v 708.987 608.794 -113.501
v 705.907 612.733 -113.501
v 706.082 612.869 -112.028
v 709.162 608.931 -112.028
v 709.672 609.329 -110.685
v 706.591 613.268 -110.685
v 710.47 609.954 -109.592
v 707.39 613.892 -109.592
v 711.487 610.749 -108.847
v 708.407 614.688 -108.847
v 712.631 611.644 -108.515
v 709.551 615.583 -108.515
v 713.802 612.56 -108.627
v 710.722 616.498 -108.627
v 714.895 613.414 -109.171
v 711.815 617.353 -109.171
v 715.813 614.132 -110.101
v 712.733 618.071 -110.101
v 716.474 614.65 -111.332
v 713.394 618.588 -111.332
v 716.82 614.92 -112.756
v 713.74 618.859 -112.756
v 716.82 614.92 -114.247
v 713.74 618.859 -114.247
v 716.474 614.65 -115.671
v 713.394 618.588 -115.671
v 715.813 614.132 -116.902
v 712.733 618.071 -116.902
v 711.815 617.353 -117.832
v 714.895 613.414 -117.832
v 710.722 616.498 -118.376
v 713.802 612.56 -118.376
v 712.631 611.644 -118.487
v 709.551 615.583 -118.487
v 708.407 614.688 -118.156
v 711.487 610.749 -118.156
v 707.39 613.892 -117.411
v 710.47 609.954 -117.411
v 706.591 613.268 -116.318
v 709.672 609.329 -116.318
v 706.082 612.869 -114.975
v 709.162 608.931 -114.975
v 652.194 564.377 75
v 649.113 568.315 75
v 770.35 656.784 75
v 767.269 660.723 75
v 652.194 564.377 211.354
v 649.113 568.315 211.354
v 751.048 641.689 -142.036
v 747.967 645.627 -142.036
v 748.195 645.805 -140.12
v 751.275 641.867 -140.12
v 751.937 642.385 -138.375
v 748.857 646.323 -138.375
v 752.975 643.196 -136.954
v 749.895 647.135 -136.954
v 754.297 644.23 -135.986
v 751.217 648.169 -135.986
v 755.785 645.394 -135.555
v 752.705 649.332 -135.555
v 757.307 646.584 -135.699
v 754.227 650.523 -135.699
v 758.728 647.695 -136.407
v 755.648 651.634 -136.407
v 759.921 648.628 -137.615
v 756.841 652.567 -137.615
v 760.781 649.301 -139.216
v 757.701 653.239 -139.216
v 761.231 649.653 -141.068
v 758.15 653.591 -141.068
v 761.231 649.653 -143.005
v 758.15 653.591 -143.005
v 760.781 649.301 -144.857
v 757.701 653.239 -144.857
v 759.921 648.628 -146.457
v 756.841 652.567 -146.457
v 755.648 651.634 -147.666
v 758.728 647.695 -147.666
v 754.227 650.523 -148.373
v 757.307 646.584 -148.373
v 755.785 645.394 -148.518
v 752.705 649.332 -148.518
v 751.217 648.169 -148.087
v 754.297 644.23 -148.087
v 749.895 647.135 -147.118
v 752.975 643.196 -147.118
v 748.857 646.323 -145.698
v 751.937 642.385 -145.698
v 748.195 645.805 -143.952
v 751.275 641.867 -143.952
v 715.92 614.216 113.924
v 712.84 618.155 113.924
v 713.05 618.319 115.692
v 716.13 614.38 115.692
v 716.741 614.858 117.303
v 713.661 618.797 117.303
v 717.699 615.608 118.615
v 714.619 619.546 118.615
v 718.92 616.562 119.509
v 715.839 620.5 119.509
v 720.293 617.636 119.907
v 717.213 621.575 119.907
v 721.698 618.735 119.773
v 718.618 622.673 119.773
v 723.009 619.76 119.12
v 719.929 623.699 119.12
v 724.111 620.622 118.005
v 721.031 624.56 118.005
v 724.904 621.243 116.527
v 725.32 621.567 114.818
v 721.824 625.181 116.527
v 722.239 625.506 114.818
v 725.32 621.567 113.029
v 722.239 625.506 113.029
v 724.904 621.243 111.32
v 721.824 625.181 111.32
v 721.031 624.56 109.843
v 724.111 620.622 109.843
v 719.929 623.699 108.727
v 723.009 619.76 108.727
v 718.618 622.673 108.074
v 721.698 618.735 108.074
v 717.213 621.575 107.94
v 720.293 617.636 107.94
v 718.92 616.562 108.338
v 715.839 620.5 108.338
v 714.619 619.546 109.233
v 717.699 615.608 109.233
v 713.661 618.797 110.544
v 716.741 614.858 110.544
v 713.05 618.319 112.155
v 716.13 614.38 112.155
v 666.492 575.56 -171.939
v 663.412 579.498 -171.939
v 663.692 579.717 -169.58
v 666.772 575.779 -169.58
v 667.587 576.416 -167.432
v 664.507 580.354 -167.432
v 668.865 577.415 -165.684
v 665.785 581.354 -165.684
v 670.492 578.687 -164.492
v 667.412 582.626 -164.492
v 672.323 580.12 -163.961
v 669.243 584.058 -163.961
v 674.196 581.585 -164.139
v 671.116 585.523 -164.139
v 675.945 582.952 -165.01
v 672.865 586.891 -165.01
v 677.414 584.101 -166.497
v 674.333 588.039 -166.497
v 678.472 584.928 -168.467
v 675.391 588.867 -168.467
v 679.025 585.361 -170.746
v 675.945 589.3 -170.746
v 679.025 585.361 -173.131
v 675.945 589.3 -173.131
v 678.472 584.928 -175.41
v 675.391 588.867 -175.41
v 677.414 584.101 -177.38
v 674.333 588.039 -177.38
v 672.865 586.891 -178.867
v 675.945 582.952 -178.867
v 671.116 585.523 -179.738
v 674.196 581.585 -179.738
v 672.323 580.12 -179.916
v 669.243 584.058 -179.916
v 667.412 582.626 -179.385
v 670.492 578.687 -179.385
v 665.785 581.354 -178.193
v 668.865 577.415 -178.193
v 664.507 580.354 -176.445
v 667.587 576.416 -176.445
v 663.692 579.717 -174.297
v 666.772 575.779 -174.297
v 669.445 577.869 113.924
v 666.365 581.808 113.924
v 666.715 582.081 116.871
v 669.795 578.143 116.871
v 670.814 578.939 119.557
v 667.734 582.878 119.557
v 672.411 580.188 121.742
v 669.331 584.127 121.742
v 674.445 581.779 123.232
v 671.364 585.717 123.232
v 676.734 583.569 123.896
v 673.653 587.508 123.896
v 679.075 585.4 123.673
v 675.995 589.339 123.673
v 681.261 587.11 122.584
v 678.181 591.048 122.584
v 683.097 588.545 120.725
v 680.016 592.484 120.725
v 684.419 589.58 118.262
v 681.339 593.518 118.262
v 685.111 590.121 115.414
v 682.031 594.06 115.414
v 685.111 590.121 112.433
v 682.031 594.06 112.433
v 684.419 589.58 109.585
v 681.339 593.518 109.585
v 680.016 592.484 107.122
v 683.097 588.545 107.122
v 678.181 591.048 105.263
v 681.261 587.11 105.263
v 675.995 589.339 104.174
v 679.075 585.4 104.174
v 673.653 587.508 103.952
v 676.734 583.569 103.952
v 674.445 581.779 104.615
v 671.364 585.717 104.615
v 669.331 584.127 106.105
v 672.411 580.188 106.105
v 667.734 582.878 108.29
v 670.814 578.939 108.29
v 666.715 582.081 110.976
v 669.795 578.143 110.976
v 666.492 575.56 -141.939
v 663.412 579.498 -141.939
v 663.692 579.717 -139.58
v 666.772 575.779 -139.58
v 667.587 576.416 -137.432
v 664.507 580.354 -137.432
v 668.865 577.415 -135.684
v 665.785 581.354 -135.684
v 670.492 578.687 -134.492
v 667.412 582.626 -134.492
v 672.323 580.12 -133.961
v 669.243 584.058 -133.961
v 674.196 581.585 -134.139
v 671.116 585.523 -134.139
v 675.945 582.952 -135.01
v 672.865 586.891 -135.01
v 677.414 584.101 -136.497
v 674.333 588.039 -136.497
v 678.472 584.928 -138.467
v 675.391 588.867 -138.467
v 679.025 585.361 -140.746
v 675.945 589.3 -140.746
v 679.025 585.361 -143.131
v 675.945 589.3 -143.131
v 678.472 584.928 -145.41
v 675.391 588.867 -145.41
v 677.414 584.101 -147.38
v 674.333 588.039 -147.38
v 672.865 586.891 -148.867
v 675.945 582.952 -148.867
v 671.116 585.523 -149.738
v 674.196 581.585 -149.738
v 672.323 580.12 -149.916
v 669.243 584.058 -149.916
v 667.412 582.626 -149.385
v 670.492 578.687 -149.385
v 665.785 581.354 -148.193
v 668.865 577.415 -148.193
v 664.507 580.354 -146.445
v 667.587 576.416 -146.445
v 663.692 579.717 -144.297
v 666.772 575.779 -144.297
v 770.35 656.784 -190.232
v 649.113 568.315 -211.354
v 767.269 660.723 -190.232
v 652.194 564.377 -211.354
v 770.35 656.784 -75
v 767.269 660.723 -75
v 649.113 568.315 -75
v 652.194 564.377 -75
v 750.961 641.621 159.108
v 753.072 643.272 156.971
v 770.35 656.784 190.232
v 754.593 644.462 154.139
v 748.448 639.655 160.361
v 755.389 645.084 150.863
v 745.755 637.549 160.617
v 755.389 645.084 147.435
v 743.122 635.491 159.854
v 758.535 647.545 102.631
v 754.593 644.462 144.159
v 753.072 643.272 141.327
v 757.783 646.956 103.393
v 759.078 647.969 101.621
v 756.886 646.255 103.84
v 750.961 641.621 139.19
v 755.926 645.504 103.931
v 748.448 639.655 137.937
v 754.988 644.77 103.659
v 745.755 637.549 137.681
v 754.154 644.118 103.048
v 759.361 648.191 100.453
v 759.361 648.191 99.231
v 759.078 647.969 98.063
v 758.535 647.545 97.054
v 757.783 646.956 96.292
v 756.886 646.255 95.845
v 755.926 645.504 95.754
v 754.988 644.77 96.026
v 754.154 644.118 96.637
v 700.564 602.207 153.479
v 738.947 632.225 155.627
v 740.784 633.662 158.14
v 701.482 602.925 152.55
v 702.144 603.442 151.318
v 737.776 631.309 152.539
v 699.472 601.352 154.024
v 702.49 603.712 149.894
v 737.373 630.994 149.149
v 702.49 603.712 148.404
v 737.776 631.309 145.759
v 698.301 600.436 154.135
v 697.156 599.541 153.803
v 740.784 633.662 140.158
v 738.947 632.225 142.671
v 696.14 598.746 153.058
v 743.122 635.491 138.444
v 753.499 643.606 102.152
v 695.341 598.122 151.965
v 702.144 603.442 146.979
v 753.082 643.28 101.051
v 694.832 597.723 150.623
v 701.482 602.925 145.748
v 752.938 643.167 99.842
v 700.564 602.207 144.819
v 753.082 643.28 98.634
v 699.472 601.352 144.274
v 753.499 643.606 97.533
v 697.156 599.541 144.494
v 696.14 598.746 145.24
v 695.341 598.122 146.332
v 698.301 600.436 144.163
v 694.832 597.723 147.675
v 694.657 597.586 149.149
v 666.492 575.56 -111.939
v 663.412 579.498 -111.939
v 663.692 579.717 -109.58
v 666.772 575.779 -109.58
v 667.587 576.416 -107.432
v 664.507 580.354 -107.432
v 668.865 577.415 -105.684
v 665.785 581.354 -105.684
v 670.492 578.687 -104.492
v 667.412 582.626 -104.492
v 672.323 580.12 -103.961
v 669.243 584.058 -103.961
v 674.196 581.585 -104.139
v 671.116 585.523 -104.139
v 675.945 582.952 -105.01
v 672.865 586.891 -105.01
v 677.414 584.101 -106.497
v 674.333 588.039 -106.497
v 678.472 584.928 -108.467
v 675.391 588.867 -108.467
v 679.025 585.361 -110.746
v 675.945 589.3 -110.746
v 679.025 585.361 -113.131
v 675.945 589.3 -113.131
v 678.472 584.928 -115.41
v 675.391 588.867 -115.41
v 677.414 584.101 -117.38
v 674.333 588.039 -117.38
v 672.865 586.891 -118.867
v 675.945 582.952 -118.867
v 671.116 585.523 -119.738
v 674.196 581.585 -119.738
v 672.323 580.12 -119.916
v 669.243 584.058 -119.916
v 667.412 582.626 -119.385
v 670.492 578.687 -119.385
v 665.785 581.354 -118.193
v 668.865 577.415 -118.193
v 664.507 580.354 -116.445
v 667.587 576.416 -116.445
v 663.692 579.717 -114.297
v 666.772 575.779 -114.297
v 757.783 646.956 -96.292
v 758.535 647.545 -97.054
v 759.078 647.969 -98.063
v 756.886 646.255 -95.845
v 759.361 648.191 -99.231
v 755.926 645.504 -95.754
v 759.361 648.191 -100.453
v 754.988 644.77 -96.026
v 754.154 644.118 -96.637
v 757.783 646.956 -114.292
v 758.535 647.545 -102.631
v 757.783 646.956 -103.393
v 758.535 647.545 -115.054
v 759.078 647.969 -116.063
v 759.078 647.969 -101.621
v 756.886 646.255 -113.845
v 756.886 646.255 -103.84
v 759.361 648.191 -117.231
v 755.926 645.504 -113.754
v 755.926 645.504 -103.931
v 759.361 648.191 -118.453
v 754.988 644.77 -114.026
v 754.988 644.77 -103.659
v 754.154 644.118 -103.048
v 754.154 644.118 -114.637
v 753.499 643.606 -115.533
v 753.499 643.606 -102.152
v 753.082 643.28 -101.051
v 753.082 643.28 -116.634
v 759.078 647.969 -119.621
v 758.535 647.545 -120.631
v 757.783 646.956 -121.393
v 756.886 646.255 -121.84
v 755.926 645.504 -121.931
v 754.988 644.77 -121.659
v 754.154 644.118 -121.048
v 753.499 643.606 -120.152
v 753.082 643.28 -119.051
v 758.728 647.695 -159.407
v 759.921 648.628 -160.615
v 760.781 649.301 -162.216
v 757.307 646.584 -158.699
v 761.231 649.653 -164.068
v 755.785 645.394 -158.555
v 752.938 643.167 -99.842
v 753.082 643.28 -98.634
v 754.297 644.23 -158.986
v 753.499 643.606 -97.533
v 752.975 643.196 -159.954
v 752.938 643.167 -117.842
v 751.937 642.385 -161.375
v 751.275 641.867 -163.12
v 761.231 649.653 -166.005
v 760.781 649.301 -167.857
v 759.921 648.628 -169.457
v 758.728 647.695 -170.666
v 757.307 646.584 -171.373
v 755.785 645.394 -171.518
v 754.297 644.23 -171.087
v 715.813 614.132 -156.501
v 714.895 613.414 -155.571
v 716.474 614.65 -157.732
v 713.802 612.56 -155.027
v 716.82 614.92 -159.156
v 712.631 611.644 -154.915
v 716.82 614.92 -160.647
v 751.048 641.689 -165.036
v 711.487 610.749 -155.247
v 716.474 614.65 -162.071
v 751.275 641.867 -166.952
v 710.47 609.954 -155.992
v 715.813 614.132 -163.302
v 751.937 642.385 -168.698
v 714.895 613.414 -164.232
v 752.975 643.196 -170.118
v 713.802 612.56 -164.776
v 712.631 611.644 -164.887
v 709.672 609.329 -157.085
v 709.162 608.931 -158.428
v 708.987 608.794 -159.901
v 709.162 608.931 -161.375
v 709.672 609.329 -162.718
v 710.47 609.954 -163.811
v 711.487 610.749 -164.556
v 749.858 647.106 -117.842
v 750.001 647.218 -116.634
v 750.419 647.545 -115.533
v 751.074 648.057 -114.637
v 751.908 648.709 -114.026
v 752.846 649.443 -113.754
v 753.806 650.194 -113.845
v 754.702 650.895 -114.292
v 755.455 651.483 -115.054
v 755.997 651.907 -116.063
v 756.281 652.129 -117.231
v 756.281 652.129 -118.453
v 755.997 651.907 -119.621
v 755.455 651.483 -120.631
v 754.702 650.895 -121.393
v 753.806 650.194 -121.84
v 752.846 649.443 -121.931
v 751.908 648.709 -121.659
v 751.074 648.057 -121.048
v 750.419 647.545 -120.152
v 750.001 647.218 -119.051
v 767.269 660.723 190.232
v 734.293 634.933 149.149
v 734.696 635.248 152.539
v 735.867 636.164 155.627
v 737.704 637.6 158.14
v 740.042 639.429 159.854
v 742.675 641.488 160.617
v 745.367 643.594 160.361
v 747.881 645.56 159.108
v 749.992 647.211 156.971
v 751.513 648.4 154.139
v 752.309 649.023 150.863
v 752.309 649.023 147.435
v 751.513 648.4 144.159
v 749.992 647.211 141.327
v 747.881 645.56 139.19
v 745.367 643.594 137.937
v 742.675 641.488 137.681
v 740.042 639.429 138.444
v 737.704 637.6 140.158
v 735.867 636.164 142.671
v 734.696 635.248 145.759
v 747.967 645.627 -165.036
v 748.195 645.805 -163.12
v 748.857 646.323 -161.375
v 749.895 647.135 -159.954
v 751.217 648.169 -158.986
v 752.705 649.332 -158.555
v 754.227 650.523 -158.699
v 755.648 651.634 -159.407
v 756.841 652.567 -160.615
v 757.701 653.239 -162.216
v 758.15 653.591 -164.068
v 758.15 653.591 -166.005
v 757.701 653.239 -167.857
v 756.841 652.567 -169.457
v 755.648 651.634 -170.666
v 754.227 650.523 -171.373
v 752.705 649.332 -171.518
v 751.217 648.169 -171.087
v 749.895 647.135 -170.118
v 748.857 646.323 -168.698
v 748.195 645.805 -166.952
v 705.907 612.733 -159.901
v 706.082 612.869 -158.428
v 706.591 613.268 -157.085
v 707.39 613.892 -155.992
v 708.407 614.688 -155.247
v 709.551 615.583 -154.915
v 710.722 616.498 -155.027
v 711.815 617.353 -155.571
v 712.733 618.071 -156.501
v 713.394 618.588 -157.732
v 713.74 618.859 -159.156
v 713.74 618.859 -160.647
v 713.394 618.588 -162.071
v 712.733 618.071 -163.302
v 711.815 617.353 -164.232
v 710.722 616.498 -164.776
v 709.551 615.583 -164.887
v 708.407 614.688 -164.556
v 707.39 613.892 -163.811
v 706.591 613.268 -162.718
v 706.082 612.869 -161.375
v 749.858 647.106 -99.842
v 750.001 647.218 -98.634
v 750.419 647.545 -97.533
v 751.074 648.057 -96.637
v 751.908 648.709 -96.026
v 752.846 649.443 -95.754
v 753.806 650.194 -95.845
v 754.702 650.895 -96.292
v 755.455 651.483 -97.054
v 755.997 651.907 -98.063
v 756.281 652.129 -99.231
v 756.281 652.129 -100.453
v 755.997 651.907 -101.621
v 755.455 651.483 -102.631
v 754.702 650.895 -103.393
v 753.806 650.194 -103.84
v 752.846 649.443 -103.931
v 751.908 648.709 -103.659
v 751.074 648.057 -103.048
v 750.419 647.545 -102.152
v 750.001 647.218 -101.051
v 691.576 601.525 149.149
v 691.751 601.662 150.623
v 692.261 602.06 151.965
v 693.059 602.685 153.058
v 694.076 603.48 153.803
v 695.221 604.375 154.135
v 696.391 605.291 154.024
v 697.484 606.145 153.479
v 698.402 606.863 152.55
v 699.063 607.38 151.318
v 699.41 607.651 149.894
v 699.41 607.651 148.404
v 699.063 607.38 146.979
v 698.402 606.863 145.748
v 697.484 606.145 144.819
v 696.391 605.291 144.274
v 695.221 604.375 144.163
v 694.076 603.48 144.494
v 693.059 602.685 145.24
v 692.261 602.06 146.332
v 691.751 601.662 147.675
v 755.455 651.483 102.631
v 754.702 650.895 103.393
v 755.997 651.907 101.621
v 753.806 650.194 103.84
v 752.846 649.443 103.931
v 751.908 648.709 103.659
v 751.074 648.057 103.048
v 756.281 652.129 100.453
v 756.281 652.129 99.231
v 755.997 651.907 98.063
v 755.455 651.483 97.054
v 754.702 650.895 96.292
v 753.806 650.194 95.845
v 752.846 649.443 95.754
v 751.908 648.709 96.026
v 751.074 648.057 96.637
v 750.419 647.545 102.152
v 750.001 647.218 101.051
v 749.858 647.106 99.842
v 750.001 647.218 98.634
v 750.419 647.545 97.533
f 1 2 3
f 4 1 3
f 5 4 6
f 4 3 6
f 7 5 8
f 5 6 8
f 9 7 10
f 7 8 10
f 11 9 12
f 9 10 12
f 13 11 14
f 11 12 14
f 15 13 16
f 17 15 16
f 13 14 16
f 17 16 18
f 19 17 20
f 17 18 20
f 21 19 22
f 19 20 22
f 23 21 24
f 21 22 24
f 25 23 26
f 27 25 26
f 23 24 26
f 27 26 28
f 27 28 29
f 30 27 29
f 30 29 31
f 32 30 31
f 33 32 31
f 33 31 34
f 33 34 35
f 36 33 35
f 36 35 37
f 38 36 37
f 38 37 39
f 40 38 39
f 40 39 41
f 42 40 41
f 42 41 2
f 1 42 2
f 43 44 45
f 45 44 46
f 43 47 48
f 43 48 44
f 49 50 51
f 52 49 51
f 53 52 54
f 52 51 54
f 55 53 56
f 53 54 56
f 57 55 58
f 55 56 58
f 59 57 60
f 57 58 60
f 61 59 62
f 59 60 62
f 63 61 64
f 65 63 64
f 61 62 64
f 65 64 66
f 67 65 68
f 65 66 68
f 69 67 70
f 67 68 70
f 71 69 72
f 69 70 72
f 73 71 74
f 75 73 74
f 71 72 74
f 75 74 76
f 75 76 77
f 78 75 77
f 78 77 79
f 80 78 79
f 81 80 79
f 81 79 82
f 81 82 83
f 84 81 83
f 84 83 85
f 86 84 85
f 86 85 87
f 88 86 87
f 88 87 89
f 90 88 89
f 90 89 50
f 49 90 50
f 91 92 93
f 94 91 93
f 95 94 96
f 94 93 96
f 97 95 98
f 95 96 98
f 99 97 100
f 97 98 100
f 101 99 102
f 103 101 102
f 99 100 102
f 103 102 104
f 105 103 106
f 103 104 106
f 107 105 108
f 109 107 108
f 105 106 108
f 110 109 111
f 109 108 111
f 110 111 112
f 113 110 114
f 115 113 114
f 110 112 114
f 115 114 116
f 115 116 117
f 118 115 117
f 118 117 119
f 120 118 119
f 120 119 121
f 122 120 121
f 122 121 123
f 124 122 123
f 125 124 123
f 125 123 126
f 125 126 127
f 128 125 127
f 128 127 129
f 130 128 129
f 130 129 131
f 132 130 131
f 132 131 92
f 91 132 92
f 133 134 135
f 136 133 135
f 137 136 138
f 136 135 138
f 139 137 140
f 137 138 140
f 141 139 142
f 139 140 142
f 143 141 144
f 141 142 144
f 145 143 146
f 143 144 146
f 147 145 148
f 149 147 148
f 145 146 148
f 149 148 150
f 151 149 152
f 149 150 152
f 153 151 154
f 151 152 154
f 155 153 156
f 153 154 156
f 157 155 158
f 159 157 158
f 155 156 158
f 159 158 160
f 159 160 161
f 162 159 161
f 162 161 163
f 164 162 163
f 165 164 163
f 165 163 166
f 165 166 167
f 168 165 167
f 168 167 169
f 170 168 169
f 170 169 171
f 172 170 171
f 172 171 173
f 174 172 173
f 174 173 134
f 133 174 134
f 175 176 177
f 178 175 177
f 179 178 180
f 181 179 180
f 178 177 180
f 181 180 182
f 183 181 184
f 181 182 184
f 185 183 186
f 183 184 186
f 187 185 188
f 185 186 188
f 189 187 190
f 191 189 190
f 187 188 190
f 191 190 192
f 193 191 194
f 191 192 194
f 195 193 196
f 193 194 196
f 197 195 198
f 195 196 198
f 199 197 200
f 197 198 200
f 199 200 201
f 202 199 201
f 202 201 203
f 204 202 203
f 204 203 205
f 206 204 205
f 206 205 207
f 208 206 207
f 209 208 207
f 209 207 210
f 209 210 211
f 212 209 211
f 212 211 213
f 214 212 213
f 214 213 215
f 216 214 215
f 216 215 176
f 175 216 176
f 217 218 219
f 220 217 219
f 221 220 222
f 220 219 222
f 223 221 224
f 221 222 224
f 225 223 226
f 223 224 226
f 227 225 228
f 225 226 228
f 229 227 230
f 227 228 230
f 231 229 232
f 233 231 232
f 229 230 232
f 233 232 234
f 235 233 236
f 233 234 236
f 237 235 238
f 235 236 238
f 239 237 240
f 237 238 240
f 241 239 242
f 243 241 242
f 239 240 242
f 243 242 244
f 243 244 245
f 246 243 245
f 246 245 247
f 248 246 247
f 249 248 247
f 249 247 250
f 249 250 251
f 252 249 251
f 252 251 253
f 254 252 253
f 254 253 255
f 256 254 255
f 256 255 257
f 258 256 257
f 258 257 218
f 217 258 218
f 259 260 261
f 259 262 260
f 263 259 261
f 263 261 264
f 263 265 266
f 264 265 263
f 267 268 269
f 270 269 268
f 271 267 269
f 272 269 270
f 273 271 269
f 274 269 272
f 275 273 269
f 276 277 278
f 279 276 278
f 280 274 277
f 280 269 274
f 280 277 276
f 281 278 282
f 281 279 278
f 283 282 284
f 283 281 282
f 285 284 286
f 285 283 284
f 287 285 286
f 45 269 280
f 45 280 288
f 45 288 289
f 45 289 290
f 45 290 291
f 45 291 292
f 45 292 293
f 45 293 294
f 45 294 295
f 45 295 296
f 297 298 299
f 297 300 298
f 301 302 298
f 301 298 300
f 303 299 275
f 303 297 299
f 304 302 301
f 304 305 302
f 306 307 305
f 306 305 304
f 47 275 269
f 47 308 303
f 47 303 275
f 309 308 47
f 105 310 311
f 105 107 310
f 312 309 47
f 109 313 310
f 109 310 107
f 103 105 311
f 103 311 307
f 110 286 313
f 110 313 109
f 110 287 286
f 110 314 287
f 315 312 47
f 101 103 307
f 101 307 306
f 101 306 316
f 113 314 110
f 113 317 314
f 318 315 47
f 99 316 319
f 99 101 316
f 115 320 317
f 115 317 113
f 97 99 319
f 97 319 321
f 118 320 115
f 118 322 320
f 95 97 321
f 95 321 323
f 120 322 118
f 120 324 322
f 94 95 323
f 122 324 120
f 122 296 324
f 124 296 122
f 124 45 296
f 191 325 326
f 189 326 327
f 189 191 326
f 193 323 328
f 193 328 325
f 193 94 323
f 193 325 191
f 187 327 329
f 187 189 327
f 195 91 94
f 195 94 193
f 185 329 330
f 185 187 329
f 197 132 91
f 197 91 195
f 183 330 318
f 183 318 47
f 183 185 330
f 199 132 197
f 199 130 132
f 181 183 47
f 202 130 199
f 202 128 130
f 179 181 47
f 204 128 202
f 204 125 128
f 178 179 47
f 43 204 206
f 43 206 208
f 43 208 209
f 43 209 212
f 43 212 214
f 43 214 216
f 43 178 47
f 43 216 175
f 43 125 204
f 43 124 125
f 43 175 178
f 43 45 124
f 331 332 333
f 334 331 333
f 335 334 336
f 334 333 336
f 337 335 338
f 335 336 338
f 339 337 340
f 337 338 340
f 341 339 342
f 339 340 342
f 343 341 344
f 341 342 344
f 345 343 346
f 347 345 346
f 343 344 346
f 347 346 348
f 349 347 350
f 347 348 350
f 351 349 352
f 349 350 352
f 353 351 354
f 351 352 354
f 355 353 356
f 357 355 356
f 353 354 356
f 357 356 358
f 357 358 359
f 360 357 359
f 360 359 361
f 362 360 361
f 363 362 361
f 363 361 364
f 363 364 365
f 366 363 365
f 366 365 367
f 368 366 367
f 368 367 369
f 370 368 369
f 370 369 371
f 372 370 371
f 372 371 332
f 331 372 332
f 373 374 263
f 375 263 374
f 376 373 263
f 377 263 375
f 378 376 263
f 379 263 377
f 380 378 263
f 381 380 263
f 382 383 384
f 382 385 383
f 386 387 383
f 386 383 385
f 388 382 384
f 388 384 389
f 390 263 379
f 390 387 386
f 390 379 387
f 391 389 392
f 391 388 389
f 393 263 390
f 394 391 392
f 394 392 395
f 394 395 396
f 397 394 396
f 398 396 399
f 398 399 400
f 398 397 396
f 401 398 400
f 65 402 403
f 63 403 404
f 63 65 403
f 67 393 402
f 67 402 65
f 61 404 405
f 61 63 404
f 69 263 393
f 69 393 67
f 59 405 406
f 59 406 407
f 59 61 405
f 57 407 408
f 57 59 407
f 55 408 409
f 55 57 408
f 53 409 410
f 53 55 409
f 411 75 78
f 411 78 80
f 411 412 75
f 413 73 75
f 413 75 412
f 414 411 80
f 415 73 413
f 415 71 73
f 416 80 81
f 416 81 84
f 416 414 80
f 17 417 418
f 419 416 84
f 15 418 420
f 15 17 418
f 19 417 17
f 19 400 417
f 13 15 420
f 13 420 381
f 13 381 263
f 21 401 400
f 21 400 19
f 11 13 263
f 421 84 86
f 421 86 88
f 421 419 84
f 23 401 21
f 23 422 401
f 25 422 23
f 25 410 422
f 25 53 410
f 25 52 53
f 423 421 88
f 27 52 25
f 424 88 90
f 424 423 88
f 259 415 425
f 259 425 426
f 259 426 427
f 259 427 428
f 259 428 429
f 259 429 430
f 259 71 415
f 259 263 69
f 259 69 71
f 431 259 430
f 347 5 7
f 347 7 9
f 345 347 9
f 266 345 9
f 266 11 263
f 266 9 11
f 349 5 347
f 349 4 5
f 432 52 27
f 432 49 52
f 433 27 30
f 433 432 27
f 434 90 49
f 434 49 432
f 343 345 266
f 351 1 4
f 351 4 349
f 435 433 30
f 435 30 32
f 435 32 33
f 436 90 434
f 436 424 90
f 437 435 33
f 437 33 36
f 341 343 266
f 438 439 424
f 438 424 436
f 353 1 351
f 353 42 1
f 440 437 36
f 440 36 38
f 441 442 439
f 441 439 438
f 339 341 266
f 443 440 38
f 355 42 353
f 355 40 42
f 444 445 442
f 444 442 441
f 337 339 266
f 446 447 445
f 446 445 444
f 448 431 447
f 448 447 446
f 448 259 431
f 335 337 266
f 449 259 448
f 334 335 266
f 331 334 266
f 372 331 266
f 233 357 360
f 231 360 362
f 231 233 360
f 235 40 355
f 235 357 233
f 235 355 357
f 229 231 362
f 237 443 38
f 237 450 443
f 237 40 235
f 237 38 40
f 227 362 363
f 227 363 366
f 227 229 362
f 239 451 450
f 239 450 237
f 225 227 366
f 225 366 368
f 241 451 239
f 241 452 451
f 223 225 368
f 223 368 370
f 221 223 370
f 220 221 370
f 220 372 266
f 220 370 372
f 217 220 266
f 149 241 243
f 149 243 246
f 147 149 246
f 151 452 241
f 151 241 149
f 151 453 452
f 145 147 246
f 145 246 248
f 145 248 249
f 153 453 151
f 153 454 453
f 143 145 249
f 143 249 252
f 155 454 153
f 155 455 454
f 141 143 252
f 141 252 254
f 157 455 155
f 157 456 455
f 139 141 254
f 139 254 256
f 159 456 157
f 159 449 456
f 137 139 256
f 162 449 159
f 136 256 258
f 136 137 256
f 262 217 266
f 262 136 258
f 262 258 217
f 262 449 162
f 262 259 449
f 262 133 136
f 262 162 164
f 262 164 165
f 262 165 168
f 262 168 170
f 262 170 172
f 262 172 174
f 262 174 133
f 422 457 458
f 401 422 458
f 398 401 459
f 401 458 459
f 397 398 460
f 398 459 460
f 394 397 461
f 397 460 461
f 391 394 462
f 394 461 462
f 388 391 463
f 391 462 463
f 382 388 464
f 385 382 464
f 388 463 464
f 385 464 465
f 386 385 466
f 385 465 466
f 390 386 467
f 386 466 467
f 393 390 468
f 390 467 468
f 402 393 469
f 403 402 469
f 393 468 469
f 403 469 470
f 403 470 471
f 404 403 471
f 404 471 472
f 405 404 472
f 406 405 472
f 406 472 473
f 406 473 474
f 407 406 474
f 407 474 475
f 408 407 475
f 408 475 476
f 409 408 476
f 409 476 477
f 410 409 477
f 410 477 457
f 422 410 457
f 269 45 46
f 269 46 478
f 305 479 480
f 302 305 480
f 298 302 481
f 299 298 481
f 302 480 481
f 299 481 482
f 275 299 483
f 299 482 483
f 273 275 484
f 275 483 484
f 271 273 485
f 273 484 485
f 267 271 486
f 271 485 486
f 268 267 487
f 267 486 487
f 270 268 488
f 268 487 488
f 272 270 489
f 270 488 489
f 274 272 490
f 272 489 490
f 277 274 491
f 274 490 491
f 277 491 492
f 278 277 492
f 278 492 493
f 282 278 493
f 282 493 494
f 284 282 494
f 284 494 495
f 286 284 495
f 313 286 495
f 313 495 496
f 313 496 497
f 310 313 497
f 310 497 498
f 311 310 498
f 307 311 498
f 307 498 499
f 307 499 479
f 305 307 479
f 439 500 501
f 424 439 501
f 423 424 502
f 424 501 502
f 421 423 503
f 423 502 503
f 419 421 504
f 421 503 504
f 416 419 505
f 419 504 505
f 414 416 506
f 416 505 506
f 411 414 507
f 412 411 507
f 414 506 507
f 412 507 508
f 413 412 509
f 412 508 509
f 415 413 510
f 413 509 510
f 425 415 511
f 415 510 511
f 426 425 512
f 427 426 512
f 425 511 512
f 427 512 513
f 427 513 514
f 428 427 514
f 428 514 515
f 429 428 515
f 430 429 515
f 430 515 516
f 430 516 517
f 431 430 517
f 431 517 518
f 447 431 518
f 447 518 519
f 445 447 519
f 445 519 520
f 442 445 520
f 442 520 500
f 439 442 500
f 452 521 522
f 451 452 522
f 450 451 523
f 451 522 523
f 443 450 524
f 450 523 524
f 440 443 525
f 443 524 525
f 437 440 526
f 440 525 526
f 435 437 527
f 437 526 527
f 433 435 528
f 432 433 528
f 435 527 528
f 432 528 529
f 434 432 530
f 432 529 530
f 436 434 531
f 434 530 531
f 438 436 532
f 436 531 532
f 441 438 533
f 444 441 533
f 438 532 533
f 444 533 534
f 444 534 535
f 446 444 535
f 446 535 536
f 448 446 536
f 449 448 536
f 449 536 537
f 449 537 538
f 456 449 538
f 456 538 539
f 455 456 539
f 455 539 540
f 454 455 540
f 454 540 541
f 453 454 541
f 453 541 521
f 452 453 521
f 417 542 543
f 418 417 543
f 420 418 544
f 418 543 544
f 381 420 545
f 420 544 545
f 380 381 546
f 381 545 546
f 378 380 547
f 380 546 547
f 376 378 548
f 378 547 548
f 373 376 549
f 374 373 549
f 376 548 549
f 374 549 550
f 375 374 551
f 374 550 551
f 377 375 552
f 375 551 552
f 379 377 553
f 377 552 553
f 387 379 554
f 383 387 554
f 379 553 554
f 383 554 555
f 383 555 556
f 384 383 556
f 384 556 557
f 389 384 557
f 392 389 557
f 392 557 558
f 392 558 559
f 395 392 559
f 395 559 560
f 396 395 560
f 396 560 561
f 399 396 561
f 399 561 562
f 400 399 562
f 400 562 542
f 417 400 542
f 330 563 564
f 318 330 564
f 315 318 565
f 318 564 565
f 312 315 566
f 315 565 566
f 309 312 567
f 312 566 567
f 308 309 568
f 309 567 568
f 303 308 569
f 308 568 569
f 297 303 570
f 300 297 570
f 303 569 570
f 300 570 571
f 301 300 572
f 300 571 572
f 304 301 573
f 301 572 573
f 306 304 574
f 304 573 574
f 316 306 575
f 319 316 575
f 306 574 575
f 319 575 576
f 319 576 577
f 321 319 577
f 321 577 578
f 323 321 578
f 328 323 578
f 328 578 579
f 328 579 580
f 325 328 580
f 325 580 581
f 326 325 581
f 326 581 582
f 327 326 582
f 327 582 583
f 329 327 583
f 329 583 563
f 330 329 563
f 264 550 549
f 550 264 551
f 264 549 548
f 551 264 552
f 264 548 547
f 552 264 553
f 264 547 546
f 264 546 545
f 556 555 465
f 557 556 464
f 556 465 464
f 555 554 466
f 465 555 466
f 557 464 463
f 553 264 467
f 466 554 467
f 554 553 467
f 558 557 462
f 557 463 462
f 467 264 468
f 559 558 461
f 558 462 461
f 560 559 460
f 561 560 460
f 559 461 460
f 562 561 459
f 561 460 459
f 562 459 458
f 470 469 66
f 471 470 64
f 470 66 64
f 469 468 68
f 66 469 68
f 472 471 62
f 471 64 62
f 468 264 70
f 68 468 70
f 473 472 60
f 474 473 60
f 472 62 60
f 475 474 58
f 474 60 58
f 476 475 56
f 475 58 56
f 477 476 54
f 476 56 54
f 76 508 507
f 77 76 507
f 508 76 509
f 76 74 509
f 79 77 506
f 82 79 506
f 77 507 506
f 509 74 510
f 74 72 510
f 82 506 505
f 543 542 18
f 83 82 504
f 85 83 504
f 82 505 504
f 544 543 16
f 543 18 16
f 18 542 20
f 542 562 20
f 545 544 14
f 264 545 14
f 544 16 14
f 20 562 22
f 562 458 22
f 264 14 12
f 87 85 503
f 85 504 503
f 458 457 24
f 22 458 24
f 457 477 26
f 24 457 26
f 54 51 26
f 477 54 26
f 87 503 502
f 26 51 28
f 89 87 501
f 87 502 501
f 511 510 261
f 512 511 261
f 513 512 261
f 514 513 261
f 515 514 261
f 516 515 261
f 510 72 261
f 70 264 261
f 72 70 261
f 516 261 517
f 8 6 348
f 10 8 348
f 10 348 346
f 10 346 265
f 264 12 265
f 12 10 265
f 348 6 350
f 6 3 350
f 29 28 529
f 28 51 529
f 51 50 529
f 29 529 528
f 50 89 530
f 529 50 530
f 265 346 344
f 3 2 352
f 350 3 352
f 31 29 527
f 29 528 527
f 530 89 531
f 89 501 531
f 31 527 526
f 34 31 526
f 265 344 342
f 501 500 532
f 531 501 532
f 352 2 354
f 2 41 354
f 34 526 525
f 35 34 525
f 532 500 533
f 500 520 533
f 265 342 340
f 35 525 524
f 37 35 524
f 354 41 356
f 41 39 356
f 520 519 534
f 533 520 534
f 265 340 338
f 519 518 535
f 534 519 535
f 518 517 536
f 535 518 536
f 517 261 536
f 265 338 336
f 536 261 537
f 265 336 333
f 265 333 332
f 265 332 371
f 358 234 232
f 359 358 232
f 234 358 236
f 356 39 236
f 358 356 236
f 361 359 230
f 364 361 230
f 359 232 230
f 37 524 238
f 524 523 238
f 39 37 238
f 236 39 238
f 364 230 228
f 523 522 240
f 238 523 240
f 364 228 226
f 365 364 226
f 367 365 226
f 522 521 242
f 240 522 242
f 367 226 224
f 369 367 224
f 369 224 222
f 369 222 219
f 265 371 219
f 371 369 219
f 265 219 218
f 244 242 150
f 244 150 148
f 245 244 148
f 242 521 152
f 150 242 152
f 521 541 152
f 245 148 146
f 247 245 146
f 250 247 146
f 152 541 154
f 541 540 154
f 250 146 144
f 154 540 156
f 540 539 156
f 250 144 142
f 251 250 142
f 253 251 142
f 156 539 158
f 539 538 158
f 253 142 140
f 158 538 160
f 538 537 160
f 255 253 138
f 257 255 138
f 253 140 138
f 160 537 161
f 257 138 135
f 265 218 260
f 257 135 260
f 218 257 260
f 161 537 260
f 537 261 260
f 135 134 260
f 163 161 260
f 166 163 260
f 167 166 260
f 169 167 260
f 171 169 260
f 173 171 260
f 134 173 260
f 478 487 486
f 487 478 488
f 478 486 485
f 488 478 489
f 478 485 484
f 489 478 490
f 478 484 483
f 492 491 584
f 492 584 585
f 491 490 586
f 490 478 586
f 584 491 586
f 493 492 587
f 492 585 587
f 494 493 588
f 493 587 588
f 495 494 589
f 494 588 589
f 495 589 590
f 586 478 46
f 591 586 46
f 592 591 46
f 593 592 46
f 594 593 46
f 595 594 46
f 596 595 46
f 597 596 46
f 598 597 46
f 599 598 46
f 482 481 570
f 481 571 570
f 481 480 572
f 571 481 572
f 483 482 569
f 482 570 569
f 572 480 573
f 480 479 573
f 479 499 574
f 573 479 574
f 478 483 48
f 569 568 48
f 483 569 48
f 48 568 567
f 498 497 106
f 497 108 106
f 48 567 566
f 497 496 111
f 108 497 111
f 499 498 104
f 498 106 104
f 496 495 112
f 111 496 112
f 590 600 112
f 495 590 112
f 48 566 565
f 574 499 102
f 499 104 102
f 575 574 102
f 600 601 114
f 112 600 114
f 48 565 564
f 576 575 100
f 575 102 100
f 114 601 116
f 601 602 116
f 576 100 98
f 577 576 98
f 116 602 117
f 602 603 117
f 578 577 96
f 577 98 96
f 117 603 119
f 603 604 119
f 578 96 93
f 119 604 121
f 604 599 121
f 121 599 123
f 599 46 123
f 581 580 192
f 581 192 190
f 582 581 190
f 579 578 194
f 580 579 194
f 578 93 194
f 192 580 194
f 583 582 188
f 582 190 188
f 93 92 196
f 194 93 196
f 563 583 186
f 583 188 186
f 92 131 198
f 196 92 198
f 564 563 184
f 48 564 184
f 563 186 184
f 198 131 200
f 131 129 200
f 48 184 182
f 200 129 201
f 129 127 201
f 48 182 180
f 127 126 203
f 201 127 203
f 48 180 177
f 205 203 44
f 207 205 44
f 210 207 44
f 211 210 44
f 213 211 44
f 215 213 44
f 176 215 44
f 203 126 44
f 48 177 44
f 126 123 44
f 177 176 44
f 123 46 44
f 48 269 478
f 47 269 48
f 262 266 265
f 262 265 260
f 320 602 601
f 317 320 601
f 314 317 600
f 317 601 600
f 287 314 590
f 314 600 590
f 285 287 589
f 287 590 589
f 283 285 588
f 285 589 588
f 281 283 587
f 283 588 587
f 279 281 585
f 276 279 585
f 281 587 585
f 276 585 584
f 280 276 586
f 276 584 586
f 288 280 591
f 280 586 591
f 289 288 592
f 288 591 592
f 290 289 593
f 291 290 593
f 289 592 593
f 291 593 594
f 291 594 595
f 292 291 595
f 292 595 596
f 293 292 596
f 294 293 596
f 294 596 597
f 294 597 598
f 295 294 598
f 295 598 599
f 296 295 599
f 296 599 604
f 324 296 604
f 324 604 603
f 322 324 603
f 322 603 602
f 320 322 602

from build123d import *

# Parameters (mm, degrees)
BOSS_EXTRUDE1_START = -7.95
BOSS_EXTRUDE1_DEPTH = 2.5
SKETCH3_W           = 150
SKETCH3_H           = 150
CUT_EXTRUDE2_DEPTH  = 7.5
SKETCH4_R           = 6.5
CUT_EXTRUDE3_DEPTH  = 10
SKETCH5_R           = 4.1
CUT_EXTRUDE4_DEPTH  = 10
SKETCH6_R           = 5
CUT_EXTRUDE5_DEPTH  = 10
SKETCH7_R           = 8
CUT_EXTRUDE6_DEPTH  = 10
SKETCH8_R           = 4.1
SKETCH8_R_2         = 11.5
SKETCH8_R_3         = 5
CUT_EXTRUDE7_DEPTH  = 10
SKETCH9_R           = 10
CUT_EXTRUDE8_DEPTH  = 10
SKETCH10_R          = 6
CUT_EXTRUDE9_DEPTH  = 10


with BuildPart() as part:
    # Sketch2 → Boss-Extrude1 (new, symmetric)
    with BuildSketch(Plane(origin=(-22.996246438, 29.403869875, 0), x_dir=(-0.7877062019611437, -0.616051085050542, 0), z_dir=(0.6160510850505418, -0.7877062019611436, 0)).offset(BOSS_EXTRUDE1_START)):
        Polygon((-1011.422009658, 190.231808412), (-1011.422009658, -190.231808412), (-861.422009658, -211.354335393), (-861.422009658, 211.354335393), align=None)
    extrude(amount=BOSS_EXTRUDE1_DEPTH, both=True)

    # Sketch3 → Cut-Extrude2 (cut, symmetric)
    with BuildSketch(Plane(origin=(-29.433980277, 37.635399685, 0), x_dir=(0.787706201961144, 0.6160510850505414, 0), z_dir=(-0.6160510850505414, 0.787706201961144, 0))):
        with Locations((936.422009658, 0)):
            Rectangle(SKETCH3_W, SKETCH3_H)
    extrude(amount=CUT_EXTRUDE2_DEPTH, both=True, mode=Mode.SUBTRACT)


with BuildPart() as cut_extrude2_piece_1:
    # of the separate pieces the step leaves, piece 1, a body of its own (cut_extrude2_pieces)
    add(part.part.solids().sort_by_distance((770.349664956, 656.784495169, -190.231808412))[0])

    # Sketch4 → Cut-Extrude3 (cut)
    with BuildSketch(Plane(origin=(-29.433980277, 37.635399685, 0), x_dir=(0.787706201961144, 0.6160510850505414, 0), z_dir=(-0.6160510850505414, 0.787706201961144, 0))):
        with Locations(Location((993.417985757, 165.036346105, 0), (0, 0, 180))):
            Circle(SKETCH4_R)
        with Locations(Location((993.417985757, 142.036346105, 0), (0, 0, 180))):
            Circle(SKETCH4_R)
    extrude(amount=-CUT_EXTRUDE3_DEPTH, mode=Mode.SUBTRACT)

    # Sketch5 → Cut-Extrude4 (cut)
    with BuildSketch(Plane(origin=(-29.433980277, 37.635399685, 0), x_dir=(0.787706201961144, 0.6160510850505414, 0), z_dir=(-0.6160510850505414, 0.787706201961144, 0))):
        with Locations(Location((993.417985757, 117.842361568, 0), (0, 0, 180))):
            Circle(SKETCH5_R)
        with Locations(Location((993.417985757, 99.842361568, 0), (0, 0, 180))):
            Circle(SKETCH5_R)
    extrude(amount=-CUT_EXTRUDE4_DEPTH, mode=Mode.SUBTRACT)

    # Sketch6 → Cut-Extrude5 (cut)
    with BuildSketch(Plane(origin=(-29.433980277, 37.635399685, 0), x_dir=(0.787706201961144, 0.6160510850505414, 0), z_dir=(-0.6160510850505414, 0.787706201961144, 0))):
        with Locations(Location((938.52192437, 159.901373806, 0), (0, 0, 180))):
            Circle(SKETCH6_R)
        with Locations(Location((938.52192437, 113.501373806, 0), (0, 0, 180))):
            Circle(SKETCH6_R)
    extrude(amount=-CUT_EXTRUDE5_DEPTH, mode=Mode.SUBTRACT)

    # Sketch7 → Cut-Extrude6 (cut)
    with BuildSketch(Plane(origin=(-29.433980277, 37.635399685, 0), x_dir=(0.787706201961144, 0.6160510850505414, 0), z_dir=(-0.6160510850505414, 0.787706201961144, 0))):
        with Locations(Location((887.574329997, 171.938506111, 0), (0, 0, 180))):
            Circle(SKETCH7_R)
        with Locations(Location((887.574329997, 141.938506111, 0), (0, 0, 180))):
            Circle(SKETCH7_R)
        with Locations(Location((887.574329997, 111.938506111, 0), (0, 0, 180))):
            Circle(SKETCH7_R)
    extrude(amount=-CUT_EXTRUDE6_DEPTH, mode=Mode.SUBTRACT)


with BuildPart() as cut_extrude2_piece_2:
    # of the separate pieces the step leaves, piece 2, a body of its own (cut_extrude2_pieces)
    add(part.part.solids().sort_by_distance((767.269409531, 660.723026179, 75))[0])

    # Sketch8 → Cut-Extrude7 (cut)
    with BuildSketch(Plane(origin=(-29.433980277, 37.635399685, 0), x_dir=(0.787706201961144, 0.6160510850505414, 0), z_dir=(-0.6160510850505414, 0.787706201961144, 0))):
        with Locations(Location((993.417985757, -99.842361568, 0), (0, 0, 180))):
            Circle(SKETCH8_R)
        with Locations(Location((981.058254788, -149.148862314, 0), (0, 0, 180))):
            Circle(SKETCH8_R_2)
        with Locations(Location((920.329120361, -149.148862314, 0), (0, 0, 180))):
            Circle(SKETCH8_R_3)
    extrude(amount=-CUT_EXTRUDE7_DEPTH, mode=Mode.SUBTRACT)

    # Sketch9 → Cut-Extrude8 (cut)
    with BuildSketch(Plane(origin=(-29.433980277, 37.635399685, 0), x_dir=(0.787706201961144, 0.6160510850505414, 0), z_dir=(-0.6160510850505414, 0.787706201961144, 0))):
        with Locations(Location((893.323046846, -113.92353986, 0), (0, 0, 180))):
            Circle(SKETCH9_R)
    extrude(amount=-CUT_EXTRUDE8_DEPTH, mode=Mode.SUBTRACT)

    # Sketch10 → Cut-Extrude9 (cut)
    with BuildSketch(Plane(origin=(-29.433980277, 37.635399685, 0), x_dir=(0.787706201961144, 0.6160510850505414, 0), z_dir=(-0.6160510850505414, 0.787706201961144, 0))):
        with Locations(Location((948.323046846, -113.92353986, 0), (0, 0, 180))):
            Circle(SKETCH10_R)
    extrude(amount=-CUT_EXTRUDE9_DEPTH, mode=Mode.SUBTRACT)


solid = Compound([cut_extrude2_piece_1.part, cut_extrude2_piece_2.part])
